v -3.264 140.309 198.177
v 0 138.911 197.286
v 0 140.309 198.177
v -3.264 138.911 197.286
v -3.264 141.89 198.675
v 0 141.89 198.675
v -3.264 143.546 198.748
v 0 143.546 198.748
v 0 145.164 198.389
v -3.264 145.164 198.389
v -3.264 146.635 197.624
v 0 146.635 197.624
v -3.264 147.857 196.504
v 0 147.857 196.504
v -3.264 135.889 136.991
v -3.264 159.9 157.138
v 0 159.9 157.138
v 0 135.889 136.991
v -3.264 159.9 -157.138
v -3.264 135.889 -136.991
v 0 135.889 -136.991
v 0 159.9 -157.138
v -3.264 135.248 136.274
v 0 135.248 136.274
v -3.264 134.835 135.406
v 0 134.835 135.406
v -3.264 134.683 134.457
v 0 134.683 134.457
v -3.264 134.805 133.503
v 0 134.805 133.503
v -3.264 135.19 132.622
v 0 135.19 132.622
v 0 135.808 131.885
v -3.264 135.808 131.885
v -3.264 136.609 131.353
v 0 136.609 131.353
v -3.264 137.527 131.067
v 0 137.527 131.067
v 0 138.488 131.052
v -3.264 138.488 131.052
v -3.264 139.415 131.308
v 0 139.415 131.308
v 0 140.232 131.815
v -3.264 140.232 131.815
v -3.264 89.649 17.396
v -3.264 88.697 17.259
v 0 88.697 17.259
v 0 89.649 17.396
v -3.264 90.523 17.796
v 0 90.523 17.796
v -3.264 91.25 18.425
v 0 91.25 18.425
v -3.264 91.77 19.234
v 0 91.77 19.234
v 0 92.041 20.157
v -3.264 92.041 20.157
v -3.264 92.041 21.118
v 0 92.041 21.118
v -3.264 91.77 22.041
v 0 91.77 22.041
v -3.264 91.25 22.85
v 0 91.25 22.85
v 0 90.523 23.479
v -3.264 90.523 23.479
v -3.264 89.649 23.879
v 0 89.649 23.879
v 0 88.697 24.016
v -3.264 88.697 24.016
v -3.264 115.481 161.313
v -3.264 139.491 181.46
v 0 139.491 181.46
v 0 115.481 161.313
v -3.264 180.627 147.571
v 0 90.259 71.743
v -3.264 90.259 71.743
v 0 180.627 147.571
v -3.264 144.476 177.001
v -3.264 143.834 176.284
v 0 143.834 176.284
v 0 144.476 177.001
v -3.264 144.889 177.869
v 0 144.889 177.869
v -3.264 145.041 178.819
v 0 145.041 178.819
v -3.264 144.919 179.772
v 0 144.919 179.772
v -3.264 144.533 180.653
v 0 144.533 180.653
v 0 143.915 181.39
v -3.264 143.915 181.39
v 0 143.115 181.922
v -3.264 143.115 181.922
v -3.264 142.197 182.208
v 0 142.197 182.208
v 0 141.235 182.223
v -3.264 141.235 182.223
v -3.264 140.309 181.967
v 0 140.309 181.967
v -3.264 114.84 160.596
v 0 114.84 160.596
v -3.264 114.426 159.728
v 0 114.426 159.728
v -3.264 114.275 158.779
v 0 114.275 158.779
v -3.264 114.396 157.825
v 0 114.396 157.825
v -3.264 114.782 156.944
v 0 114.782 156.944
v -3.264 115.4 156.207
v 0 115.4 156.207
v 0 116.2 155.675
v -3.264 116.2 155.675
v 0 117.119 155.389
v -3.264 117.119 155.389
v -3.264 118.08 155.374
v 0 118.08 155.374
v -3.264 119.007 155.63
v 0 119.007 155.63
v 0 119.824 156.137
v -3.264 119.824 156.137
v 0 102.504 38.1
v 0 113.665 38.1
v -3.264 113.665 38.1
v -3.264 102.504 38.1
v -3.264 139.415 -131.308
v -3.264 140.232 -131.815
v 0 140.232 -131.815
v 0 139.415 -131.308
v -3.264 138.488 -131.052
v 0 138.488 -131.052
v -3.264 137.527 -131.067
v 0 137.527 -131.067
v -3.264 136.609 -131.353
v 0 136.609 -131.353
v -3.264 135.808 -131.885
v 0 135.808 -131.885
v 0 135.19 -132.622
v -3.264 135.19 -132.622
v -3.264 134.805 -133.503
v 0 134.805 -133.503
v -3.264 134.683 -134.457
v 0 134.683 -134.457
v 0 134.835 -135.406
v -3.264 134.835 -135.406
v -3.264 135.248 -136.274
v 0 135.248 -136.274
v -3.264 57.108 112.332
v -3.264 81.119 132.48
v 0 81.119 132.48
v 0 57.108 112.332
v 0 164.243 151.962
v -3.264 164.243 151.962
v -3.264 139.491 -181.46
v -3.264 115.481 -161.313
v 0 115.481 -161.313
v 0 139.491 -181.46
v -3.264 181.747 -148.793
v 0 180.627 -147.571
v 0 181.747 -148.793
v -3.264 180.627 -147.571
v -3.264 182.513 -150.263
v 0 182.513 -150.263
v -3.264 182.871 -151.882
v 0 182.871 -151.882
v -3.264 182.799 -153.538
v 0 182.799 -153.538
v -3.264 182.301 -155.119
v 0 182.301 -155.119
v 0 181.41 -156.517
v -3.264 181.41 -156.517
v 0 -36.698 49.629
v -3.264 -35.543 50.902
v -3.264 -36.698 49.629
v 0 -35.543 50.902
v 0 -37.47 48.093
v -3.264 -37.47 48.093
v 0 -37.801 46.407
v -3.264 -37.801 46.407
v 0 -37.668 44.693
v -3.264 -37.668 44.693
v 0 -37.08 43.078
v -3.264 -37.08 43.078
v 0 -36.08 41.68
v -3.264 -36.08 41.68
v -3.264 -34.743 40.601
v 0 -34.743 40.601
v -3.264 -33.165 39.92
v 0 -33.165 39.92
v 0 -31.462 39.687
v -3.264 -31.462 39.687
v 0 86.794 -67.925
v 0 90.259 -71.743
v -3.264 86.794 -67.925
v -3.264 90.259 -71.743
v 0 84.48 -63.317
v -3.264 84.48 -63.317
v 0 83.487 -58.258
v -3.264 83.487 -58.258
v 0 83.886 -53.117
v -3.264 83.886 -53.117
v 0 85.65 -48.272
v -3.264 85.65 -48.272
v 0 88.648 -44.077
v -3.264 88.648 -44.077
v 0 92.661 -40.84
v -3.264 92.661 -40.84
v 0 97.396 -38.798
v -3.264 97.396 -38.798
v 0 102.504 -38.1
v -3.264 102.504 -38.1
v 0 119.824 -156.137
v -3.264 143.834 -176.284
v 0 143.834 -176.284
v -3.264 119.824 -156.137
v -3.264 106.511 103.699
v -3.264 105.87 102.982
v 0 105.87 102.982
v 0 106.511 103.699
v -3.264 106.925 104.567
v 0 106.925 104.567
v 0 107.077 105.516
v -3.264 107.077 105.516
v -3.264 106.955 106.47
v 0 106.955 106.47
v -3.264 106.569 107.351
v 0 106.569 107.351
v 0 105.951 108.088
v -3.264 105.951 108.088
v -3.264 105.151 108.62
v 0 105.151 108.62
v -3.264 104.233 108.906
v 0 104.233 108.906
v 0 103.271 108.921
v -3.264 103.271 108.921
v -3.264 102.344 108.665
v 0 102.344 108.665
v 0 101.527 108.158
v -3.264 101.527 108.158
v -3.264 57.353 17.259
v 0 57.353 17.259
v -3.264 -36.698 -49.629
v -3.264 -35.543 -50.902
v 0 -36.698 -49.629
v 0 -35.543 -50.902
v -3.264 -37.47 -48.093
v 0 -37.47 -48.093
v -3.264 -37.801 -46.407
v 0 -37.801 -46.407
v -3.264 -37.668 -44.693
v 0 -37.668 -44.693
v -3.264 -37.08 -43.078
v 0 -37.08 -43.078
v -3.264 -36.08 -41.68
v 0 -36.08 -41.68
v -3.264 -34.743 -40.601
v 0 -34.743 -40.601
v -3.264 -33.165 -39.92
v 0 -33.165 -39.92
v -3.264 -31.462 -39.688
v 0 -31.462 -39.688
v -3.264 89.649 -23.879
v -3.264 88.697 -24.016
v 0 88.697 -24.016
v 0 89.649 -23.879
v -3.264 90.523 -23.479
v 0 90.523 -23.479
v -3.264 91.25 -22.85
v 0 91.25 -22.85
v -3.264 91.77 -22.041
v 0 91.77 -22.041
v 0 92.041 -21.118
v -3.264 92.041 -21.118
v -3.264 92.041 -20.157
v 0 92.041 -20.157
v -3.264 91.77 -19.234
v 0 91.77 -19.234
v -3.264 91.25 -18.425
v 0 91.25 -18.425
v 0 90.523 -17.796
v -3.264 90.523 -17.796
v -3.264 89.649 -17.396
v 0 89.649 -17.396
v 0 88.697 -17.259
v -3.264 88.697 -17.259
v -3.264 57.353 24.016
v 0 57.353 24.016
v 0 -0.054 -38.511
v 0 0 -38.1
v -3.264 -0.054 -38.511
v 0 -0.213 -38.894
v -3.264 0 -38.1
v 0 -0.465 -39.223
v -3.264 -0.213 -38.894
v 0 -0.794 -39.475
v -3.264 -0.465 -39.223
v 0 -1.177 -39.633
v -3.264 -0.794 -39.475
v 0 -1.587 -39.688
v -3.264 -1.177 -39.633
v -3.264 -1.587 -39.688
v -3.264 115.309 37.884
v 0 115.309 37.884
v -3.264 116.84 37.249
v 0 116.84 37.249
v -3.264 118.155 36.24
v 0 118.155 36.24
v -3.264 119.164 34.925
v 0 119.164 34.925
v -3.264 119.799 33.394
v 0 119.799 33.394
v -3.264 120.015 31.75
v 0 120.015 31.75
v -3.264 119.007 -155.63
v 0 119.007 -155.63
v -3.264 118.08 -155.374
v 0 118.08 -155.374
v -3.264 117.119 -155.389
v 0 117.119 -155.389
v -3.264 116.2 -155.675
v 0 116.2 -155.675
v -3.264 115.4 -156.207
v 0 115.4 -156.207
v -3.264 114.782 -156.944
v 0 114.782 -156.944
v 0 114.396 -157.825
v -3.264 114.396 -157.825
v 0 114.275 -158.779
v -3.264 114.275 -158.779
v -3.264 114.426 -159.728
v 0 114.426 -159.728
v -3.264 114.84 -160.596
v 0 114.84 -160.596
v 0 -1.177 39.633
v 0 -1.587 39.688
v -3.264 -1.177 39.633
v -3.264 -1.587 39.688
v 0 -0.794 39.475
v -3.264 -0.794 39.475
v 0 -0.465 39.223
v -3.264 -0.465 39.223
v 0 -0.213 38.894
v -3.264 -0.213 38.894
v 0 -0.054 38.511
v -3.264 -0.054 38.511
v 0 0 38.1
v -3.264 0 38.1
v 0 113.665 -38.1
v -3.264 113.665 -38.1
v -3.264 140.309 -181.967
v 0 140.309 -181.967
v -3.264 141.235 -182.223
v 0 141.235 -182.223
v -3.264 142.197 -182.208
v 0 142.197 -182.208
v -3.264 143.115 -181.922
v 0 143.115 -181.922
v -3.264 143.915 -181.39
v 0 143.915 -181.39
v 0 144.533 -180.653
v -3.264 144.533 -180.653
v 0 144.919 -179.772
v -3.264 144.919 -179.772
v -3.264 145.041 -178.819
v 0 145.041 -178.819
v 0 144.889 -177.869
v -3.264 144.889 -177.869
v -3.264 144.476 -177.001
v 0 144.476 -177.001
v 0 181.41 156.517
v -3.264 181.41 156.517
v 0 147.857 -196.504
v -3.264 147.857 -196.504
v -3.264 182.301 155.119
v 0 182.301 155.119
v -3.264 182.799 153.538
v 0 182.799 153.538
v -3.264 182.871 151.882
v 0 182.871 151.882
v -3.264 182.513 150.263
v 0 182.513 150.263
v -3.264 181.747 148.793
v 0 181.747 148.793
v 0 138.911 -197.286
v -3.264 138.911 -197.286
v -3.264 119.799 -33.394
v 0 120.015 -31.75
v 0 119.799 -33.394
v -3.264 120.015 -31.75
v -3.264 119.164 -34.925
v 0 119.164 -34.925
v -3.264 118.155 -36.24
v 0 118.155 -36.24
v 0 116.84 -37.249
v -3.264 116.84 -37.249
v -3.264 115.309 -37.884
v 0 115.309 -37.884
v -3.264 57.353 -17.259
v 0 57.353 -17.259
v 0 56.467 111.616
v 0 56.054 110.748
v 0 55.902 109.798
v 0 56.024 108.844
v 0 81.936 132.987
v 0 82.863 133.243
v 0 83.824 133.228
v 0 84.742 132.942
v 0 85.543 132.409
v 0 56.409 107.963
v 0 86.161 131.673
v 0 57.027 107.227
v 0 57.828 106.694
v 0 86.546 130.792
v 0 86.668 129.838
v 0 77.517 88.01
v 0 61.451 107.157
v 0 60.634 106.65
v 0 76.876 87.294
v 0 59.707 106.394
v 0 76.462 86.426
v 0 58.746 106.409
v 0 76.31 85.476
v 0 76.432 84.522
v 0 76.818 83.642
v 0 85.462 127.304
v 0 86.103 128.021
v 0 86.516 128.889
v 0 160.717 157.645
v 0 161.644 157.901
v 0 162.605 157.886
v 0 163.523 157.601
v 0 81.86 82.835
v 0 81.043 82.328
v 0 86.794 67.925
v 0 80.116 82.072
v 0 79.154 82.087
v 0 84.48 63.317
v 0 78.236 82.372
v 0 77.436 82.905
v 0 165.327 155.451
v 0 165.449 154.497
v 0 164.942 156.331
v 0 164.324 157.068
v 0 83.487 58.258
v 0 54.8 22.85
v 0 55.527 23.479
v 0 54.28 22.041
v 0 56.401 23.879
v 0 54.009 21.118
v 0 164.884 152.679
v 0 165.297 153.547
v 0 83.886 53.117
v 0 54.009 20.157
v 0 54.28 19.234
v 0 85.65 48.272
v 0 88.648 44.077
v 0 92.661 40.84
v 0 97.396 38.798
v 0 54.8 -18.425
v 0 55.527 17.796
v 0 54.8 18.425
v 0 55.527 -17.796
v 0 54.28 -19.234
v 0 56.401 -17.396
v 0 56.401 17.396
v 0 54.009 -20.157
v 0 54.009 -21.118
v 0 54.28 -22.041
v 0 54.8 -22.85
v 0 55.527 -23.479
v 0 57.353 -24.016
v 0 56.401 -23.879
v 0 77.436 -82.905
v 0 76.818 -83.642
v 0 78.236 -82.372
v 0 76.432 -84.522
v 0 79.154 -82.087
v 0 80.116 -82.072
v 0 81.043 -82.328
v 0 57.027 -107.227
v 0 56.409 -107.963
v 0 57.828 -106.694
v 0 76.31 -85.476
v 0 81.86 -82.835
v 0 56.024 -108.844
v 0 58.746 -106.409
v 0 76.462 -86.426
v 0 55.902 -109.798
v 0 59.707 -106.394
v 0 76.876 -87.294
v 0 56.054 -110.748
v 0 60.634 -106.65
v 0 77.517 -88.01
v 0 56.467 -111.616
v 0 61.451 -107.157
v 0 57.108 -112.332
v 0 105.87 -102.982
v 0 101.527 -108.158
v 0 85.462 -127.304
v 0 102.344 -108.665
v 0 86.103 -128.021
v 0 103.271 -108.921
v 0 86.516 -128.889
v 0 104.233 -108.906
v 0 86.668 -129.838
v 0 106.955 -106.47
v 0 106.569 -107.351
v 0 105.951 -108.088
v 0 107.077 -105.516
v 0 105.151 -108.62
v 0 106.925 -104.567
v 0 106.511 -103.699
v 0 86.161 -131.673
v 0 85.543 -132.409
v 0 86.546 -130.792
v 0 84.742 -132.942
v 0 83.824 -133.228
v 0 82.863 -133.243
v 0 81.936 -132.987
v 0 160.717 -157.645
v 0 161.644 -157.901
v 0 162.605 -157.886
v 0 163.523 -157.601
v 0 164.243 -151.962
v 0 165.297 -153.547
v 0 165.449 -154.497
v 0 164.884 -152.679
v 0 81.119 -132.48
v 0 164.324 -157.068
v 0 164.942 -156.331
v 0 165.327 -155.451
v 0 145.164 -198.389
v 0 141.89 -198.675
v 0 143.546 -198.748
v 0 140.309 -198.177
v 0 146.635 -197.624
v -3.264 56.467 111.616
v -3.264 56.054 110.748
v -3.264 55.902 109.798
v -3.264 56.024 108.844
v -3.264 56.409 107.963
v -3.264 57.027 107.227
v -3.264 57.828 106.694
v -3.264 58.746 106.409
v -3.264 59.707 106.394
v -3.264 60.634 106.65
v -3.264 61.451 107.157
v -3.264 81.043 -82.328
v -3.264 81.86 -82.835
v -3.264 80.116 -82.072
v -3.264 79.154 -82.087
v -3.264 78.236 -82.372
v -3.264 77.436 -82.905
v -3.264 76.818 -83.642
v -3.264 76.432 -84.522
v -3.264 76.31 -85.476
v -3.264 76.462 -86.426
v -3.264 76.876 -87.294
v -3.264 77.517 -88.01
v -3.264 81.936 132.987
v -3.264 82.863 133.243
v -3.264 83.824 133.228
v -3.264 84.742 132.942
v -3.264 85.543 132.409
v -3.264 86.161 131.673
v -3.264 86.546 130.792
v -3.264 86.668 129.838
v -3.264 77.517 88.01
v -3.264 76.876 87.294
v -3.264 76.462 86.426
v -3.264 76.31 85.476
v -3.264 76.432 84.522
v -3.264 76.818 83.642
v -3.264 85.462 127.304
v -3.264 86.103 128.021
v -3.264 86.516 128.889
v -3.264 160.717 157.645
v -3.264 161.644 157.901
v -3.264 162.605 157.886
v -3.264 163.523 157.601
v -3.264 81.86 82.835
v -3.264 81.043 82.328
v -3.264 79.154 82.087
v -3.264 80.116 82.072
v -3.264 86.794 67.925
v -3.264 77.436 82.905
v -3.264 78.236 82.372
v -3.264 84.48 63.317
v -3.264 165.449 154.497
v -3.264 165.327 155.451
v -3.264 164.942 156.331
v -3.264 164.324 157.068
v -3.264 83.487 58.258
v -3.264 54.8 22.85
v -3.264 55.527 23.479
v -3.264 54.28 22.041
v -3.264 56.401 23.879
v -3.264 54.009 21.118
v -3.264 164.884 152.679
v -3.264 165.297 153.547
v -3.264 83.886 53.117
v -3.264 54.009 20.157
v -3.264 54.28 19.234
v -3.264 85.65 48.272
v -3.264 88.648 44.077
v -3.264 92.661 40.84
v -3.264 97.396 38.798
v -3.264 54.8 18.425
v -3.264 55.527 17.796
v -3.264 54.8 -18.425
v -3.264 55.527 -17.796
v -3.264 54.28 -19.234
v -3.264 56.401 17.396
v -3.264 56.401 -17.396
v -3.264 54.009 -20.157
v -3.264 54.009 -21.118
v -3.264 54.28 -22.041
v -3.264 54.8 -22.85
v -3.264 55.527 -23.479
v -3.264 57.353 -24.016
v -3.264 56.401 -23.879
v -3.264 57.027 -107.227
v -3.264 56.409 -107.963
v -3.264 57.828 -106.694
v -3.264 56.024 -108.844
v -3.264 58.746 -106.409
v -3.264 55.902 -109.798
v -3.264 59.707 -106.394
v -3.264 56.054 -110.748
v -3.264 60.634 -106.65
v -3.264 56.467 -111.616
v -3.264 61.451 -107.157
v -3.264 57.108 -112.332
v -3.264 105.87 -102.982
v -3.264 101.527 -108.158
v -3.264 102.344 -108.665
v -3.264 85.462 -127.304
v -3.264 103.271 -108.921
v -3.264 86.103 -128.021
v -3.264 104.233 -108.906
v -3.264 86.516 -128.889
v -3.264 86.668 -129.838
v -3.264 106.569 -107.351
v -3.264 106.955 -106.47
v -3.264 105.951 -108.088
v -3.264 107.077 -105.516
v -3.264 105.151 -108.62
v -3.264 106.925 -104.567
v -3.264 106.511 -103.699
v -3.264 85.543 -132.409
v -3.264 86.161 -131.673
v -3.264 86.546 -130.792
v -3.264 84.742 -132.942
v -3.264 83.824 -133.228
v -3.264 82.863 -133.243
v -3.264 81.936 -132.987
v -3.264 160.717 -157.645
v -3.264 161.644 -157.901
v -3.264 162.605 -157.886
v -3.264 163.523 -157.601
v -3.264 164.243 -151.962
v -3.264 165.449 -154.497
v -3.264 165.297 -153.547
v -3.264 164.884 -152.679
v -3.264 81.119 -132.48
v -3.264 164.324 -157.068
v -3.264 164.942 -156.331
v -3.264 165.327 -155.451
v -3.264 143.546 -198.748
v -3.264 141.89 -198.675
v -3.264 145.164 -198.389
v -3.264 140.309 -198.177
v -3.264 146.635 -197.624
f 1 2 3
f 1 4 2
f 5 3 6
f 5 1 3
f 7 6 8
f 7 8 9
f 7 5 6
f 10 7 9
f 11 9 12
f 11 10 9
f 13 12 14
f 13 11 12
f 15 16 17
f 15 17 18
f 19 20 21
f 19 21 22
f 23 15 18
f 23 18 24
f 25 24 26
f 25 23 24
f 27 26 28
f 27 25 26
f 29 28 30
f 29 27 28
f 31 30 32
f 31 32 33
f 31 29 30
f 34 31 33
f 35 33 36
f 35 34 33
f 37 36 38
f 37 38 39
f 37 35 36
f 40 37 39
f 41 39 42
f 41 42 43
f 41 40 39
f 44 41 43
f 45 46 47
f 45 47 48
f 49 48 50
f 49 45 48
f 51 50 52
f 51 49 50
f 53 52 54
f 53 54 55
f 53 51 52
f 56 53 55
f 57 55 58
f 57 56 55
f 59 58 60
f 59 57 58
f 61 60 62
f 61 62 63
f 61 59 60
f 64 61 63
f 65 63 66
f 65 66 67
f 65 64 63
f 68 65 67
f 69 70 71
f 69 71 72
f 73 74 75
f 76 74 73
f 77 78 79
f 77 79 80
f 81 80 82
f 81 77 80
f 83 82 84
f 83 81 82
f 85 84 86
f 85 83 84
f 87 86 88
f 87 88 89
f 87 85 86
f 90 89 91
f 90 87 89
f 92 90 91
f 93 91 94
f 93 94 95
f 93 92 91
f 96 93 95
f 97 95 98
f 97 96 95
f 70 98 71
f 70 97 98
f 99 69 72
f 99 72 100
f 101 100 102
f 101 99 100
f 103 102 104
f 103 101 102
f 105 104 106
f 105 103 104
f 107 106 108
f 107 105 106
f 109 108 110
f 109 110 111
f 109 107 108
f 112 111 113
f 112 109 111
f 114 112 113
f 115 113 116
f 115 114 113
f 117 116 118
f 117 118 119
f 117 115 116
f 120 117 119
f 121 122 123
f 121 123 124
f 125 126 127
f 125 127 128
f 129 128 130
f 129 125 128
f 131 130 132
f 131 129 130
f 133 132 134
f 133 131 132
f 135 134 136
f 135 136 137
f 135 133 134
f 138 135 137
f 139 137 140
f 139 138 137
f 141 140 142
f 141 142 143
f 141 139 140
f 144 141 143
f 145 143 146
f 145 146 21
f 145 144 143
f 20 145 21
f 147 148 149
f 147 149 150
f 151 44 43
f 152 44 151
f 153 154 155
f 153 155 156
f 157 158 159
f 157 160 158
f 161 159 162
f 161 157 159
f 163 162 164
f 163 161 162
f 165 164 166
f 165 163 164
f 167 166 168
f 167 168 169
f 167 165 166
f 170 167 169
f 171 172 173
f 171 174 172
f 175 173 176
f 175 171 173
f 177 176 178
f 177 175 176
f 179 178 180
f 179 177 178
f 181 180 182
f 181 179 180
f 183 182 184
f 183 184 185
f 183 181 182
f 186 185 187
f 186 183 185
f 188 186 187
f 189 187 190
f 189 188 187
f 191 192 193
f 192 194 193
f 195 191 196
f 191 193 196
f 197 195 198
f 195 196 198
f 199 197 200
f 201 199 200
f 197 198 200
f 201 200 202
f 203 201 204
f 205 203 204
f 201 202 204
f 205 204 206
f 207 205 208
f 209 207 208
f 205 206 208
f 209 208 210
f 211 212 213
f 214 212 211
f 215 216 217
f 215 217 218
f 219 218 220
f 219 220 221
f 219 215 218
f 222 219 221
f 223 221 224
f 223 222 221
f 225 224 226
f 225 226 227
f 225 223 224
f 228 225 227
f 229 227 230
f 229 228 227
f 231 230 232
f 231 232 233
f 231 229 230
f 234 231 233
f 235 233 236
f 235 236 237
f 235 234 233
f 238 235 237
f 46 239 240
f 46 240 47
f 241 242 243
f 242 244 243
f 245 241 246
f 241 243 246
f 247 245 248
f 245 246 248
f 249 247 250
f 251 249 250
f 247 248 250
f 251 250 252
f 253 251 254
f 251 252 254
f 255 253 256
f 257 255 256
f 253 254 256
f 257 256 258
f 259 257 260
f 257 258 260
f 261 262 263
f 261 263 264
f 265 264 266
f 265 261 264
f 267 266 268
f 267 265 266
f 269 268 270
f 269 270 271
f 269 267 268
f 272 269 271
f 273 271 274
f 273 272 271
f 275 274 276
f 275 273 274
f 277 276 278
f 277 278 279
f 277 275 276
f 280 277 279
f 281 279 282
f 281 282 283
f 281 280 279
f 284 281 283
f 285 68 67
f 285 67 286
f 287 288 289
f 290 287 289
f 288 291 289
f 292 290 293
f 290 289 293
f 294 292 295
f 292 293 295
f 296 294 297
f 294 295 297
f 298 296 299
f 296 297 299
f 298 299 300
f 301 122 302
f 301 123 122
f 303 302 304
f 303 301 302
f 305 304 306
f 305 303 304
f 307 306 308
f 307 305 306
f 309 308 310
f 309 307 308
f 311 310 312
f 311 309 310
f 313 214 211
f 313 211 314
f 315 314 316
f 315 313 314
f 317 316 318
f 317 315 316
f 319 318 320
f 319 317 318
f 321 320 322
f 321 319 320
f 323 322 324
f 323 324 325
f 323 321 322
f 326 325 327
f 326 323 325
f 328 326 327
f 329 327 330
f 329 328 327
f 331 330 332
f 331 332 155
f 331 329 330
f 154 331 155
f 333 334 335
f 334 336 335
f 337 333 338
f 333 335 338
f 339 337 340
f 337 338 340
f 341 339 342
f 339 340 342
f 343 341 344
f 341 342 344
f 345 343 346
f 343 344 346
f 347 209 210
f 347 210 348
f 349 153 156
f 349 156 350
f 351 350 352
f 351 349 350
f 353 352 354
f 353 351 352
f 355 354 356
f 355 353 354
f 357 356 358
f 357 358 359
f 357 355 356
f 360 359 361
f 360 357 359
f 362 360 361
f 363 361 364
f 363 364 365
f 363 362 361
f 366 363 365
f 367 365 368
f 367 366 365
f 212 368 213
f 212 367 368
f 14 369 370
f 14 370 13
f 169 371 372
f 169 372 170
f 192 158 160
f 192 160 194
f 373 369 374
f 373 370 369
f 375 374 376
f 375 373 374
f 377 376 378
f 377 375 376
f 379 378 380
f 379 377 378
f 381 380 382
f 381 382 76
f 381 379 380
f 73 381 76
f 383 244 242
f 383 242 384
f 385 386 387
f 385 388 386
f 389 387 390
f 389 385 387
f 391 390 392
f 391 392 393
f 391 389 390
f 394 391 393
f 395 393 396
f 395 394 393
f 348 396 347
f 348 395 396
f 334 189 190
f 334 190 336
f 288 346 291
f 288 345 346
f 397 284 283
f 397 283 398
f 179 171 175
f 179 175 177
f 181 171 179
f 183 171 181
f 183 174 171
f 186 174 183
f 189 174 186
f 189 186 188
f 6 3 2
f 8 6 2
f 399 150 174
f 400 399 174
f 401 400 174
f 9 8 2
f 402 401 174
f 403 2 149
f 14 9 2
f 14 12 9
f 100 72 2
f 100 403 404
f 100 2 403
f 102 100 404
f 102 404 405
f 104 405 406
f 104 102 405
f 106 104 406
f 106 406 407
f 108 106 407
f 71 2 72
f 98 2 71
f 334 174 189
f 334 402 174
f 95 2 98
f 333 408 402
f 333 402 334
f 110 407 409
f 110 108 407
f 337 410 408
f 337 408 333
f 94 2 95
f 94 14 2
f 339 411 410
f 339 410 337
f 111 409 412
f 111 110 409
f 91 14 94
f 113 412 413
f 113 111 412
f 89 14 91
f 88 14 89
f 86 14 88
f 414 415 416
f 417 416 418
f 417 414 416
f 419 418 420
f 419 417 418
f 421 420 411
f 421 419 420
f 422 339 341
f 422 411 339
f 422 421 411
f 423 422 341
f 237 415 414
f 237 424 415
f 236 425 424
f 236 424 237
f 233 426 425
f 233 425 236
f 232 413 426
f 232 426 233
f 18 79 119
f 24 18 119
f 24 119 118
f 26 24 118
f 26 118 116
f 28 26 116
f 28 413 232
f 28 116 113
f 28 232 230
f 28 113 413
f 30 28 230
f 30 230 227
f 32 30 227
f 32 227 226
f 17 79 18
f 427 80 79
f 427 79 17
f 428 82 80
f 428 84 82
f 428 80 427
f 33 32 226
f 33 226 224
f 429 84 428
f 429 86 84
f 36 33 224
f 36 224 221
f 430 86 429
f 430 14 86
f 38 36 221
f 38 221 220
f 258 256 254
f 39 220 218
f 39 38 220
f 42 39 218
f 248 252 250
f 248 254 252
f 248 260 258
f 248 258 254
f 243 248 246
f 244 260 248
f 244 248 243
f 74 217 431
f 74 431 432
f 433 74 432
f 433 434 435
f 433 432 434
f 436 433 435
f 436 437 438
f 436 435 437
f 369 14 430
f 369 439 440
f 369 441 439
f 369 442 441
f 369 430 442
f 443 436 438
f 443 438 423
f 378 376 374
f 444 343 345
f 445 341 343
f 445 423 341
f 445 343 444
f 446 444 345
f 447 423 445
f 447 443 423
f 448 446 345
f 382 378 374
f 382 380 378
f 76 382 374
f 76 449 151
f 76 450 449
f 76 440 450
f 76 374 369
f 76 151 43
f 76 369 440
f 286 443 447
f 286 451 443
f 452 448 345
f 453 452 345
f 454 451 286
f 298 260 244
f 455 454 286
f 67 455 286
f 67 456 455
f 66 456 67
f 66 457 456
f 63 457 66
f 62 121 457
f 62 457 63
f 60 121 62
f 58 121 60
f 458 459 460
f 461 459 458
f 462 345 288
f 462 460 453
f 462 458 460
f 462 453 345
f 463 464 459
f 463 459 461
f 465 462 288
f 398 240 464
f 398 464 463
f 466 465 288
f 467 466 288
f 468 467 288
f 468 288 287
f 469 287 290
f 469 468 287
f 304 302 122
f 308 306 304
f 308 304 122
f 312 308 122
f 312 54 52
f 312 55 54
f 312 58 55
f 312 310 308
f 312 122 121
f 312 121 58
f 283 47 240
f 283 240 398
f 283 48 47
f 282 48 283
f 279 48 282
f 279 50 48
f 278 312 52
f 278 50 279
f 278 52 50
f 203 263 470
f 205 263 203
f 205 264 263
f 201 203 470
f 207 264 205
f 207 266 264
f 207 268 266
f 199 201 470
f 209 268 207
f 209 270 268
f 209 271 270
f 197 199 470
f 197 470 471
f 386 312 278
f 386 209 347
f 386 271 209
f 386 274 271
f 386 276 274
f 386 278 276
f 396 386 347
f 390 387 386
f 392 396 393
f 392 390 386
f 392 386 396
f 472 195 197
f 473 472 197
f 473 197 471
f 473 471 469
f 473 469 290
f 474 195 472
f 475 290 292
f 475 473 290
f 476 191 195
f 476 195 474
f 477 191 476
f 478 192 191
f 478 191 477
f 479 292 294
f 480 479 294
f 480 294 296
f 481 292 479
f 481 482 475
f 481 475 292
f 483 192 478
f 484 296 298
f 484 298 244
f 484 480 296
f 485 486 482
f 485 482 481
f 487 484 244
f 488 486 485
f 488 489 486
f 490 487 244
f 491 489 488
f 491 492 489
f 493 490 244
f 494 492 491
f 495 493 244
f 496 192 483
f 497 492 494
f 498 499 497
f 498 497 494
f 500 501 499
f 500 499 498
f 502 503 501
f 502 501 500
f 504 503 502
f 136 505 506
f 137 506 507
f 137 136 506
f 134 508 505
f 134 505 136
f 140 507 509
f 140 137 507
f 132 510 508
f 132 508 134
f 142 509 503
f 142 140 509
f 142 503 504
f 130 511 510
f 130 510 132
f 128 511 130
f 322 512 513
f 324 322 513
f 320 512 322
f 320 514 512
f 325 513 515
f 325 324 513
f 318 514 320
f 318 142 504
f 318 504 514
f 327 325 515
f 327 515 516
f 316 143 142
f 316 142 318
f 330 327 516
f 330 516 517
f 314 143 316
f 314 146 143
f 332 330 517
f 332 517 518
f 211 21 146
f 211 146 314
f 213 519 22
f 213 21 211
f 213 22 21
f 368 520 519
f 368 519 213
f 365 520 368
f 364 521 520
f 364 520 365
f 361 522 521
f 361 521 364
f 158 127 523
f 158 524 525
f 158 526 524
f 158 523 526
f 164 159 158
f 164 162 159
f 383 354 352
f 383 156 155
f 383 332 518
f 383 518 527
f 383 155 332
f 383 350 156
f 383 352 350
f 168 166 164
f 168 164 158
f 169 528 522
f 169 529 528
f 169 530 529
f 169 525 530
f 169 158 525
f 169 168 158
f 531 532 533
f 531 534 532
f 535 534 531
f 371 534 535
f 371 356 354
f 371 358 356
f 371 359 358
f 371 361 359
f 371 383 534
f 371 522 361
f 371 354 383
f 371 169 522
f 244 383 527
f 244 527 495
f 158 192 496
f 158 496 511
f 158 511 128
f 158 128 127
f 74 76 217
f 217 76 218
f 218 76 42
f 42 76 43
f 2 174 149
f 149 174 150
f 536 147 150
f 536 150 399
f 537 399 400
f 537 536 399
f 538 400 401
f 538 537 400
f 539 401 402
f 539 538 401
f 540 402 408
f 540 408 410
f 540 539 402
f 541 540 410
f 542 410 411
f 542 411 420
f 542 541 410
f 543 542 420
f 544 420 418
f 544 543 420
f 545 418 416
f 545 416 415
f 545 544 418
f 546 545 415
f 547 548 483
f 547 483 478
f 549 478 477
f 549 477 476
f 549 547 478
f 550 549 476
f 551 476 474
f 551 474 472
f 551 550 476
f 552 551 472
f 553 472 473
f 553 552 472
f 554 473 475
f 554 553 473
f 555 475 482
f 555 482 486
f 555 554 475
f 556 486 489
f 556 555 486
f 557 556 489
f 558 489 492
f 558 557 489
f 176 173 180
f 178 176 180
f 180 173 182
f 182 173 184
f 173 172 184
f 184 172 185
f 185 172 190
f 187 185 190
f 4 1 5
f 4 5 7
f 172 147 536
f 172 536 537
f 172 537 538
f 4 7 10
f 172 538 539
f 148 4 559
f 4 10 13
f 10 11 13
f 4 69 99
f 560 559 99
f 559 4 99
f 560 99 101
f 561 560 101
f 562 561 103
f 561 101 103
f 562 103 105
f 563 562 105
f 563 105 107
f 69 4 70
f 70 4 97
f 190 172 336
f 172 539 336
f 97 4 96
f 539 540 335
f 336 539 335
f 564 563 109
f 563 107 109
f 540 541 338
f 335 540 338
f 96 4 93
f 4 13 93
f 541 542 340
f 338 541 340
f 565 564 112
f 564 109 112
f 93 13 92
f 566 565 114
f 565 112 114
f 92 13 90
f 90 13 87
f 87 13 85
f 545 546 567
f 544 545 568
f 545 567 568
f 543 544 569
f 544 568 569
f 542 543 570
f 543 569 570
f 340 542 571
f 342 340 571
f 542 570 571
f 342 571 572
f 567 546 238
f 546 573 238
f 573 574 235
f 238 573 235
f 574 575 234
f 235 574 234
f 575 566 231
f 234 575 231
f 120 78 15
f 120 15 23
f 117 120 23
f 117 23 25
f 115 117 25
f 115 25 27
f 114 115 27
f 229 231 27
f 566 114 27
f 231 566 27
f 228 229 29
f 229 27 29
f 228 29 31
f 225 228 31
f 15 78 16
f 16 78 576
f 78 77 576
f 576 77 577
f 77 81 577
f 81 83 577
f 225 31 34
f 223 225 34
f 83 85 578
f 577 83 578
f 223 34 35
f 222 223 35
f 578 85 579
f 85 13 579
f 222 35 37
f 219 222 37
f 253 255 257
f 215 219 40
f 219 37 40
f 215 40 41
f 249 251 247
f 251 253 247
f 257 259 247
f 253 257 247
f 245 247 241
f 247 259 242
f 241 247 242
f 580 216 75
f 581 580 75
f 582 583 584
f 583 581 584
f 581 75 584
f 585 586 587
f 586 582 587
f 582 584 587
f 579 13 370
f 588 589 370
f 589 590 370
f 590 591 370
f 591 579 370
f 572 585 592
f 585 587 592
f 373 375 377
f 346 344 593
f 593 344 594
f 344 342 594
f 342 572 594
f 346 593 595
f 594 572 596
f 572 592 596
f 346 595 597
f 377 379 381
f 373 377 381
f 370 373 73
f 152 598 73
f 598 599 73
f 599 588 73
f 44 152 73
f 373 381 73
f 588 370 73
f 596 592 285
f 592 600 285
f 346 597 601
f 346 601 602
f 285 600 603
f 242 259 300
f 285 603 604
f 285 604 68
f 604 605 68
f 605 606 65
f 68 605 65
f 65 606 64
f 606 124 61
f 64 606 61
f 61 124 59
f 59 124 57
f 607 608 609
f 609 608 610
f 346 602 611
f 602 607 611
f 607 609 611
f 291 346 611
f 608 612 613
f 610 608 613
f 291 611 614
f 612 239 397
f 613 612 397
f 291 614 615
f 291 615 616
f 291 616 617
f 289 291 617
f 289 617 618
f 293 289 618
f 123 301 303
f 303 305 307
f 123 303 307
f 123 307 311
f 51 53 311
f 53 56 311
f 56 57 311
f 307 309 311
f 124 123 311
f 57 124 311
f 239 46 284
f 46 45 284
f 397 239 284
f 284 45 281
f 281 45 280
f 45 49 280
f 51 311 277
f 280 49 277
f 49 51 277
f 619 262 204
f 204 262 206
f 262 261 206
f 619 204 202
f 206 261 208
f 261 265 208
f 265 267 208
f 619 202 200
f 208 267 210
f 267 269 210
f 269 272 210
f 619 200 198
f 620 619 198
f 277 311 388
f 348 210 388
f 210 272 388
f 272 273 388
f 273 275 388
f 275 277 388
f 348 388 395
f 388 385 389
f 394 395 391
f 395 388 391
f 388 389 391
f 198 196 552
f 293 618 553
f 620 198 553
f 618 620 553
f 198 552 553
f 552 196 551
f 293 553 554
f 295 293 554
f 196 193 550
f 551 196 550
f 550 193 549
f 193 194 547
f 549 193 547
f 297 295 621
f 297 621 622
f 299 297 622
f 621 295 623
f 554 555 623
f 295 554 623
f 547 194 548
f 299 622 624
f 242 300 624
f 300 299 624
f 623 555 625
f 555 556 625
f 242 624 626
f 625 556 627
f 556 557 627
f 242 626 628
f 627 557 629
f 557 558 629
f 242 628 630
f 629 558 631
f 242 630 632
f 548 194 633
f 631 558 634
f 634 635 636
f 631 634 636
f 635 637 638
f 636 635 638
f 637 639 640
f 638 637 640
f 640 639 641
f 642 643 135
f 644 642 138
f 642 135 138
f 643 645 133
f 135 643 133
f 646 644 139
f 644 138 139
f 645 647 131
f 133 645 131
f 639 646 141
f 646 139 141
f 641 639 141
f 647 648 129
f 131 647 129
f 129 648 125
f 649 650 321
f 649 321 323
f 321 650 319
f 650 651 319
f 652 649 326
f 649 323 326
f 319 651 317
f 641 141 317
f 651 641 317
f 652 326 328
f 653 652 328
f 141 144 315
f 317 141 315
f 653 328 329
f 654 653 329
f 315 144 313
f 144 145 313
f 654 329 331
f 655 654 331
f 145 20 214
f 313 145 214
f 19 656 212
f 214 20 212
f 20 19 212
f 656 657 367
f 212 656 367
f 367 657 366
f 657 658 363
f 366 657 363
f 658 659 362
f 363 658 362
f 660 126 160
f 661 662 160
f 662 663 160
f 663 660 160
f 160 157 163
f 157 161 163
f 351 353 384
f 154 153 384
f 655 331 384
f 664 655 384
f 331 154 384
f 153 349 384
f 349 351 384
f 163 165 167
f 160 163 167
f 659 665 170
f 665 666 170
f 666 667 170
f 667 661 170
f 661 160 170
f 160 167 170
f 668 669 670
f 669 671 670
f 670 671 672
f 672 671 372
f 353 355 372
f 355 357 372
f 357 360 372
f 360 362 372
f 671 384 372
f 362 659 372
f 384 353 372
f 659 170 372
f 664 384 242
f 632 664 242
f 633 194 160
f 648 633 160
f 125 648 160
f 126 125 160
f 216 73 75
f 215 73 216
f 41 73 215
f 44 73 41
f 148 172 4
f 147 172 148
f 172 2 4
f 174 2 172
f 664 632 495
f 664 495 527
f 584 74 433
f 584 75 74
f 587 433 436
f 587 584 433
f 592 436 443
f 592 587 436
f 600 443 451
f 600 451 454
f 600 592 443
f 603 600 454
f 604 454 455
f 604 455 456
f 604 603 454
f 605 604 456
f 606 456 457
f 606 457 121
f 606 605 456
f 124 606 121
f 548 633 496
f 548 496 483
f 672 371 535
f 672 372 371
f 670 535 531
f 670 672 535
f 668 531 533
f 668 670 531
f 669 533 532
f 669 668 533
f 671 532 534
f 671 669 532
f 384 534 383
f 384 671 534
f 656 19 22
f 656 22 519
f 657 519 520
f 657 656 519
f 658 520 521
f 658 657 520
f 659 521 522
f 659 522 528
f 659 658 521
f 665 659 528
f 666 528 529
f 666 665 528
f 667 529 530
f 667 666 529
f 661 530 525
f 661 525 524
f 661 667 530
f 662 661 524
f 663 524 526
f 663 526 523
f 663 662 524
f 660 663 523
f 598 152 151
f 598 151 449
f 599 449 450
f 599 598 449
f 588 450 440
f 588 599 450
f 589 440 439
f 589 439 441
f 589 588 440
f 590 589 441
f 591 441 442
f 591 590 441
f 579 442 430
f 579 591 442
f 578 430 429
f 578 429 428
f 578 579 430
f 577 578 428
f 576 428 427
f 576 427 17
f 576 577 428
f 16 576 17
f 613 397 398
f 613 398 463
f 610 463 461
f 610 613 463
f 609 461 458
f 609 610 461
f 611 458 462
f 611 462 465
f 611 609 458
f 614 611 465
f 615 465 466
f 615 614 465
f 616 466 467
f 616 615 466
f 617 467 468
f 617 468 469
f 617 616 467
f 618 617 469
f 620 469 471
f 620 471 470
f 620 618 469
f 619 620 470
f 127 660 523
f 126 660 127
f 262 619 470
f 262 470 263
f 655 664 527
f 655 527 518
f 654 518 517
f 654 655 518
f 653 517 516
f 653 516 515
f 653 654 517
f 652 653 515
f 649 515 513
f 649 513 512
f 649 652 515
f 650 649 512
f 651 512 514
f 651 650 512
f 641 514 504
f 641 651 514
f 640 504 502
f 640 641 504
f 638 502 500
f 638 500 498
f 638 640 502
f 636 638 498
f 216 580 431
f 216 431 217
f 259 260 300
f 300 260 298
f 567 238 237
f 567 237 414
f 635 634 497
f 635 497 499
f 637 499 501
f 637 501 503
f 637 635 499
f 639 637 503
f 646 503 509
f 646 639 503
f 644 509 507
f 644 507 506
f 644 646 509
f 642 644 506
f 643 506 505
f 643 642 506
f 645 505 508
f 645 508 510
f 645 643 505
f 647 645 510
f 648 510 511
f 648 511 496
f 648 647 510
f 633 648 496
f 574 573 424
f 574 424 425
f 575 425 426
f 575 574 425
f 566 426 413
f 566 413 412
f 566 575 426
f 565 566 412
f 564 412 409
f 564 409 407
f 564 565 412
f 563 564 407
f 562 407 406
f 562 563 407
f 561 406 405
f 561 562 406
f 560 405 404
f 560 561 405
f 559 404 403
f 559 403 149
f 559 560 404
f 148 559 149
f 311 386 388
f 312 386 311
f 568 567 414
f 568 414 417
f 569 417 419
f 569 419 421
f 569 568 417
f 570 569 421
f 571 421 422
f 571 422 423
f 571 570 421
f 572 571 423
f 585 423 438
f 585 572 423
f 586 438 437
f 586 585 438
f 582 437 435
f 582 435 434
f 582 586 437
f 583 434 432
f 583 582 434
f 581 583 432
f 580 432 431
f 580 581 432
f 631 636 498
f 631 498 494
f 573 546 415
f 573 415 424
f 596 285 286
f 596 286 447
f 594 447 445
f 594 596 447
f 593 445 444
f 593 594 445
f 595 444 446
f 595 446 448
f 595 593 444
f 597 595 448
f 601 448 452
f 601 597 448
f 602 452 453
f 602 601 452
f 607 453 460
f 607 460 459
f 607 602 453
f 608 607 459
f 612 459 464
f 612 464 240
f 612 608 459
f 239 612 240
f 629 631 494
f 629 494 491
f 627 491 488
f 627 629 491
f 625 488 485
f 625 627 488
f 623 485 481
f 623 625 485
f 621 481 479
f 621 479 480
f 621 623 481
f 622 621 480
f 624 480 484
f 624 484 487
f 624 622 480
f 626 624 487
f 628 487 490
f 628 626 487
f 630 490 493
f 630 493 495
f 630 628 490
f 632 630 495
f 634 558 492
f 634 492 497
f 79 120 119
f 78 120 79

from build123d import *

# Parameters (mm, degrees)
BASE_FLANGE1_DEPTH          = 3.2639
F_1_4_START                 = -3.2639
F_1_4_CLEARANCE_SLOT1_DEPTH = 3.2639
SKETCH9_W                   = 1.5875
SKETCH9_H                   = 50.8
CUT_EXTRUDE1_DEPTH          = 274.80079868
FILLET1_R                   = 6.35
FILLET2_R                   = 19.05
FILLET3_R                   = 6.35
FILLET4_R                   = 1.5875
F_1_4_CLEARANCE_SLOT2_DEPTH = 3.2639
F_1_4_CLEARANCE_SLOT3_DEPTH = 3.2639


# Read off the part's stored shape, not the designer's step: 1/4 Clearance Slot1, 1/4 Clearance Slot2, 1/4 Clearance Slot3
# Sheet-metal steps are written as plain solids
with BuildPart() as part:
    # Sketch1 → Base-Flange1 (new body)
    with BuildSketch(Plane(origin=(0, 0, 0), x_dir=(0, 0, -1), z_dir=(1, 0, 0))):
        Polygon((38.1, 0), (38.1, -50.8), (201.36805286, 143.775288552), (151.652495469, 185.491594423), (38.1, 50.165), (38.1, 120.015), (-38.1, 120.015), (-38.1, 50.165), (-151.652495469, 185.491594423), (-201.36805286, 143.775288552), (-38.1, -50.8), (-38.1, 0), align=None)
    extrude(amount=-BASE_FLANGE1_DEPTH)

    # 1/4 Clearance Slot1 outline → 1/4 Clearance Slot1 (cut)
    with BuildSketch(Plane.YZ.offset(F_1_4_START)):
        with BuildLine():
            Line((57.3532, -24.0157), (88.6968, -24.0157))
            ThreePointArc((88.6968, -24.0157), (92.075, -20.6375), (88.6968, -17.2593))
            Line((88.6968, -17.2593), (57.3532, -17.2593))
            ThreePointArc((57.3532, -17.2593), (53.975, -20.6375), (57.3532, -24.0157))
        make_face()
        with BuildLine():
            Line((57.3532, 17.2593), (88.6968, 17.2593))
            ThreePointArc((88.6968, 17.2593), (92.075, 20.6375), (88.6968, 24.0157))
            Line((88.6968, 24.0157), (57.3532, 24.0157))
            ThreePointArc((57.3532, 24.0157), (53.975, 20.6375), (57.3532, 17.2593))
        make_face()
    extrude(amount=F_1_4_CLEARANCE_SLOT1_DEPTH, mode=Mode.SUBTRACT)

    # Sketch9 → Cut-Extrude1 (cut, through all)
    with BuildSketch(Plane(origin=(0, 0, 0), x_dir=(0, 0, -1), z_dir=(1, 0, 0))):
        with Locations((-38.89375, -25.4)):
            Rectangle(SKETCH9_W, SKETCH9_H)
        with Locations((38.89375, -25.4)):
            Rectangle(SKETCH9_W, SKETCH9_H)
    extrude(amount=-CUT_EXTRUDE1_DEPTH, mode=Mode.SUBTRACT)

    # Fillet1
    fillet1_edges = [part.edges().sort_by_distance(p)[0] for p in [
        (-1.63195, 185.491594423, -151.652495469),
        (-1.63195, 143.775288552, -201.36805286),
        (-1.63195, 143.775288552, 201.36805286),
        (-1.63195, 185.491594423, 151.652495469),
        (-1.63195, -48.908091172, 39.6875),
        (-1.63195, -48.908091172, -39.6875),
    ]]
    fillet(fillet1_edges, radius=FILLET1_R)

    # Fillet2
    fillet2_edges = [part.edges().sort_by_distance(p)[0] for p in [
        (-1.63195, 50.165, -38.1),
        (-1.63195, 50.165, 38.1),
    ]]
    fillet(fillet2_edges, radius=FILLET2_R)

    # Fillet3
    fillet3_edges = [part.edges().sort_by_distance(p)[0] for p in [
        (-1.63195, 120.015, 38.1),
        (-1.63195, 120.015, -38.1),
    ]]
    fillet(fillet3_edges, radius=FILLET3_R)

    # Fillet4
    fillet4_edges = [part.edges().sort_by_distance(p)[0] for p in [
        (-1.63195, 0, 39.6875),
        (-1.63195, 0, -39.6875),
    ]]
    fillet(fillet4_edges, radius=FILLET4_R)

    # 1/4 Clearance Slot2 outline → 1/4 Clearance Slot2 (cut)
    with BuildSketch(Plane.YZ.offset(F_1_4_START)):
        with BuildLine():
            Line((105.870311236, -102.982051315), (81.859720628, -82.834773592))
            ThreePointArc((81.859720628, -82.834773592), (77.100404187, -83.251159826), (77.516790422, -88.010476267))
            Line((77.516790422, -88.010476267), (101.527381029, -108.15775399))
            ThreePointArc((101.527381029, -108.15775399), (106.28669747, -107.741367756), (105.870311236, -102.982051315))
        make_face()
        with BuildLine():
            ThreePointArc((140.232307194, -131.81518945), (135.472990753, -132.231575685), (135.889376988, -136.990892126))
            Line((135.889376988, -136.990892126), (159.899967595, -157.138169849))
            ThreePointArc((159.899967595, -157.138169849), (164.659284036, -156.721783614), (164.242897801, -151.962467173))
            Line((164.242897801, -151.962467173), (140.232307194, -131.81518945))
        make_face()
        with BuildLine():
            Line((85.461804628, -127.303962384), (61.451214021, -107.156684661))
            ThreePointArc((61.451214021, -107.156684661), (56.69189758, -107.573070895), (57.108283815, -112.332387336))
            Line((57.108283815, -112.332387336), (81.118874422, -132.479665059))
            ThreePointArc((81.118874422, -132.479665059), (85.878190863, -132.063278825), (85.461804628, -127.303962384))
        make_face()
        with BuildLine():
            ThreePointArc((119.823800586, -156.137100519), (115.064484146, -156.553486754), (115.48087038, -161.312803195))
            Line((115.48087038, -161.312803195), (139.491460988, -181.460080918))
            ThreePointArc((139.491460988, -181.460080918), (144.250777428, -181.043694683), (143.834391194, -176.284378242))
            Line((143.834391194, -176.284378242), (119.823800586, -156.137100519))
        make_face()
    extrude(amount=F_1_4_CLEARANCE_SLOT2_DEPTH, mode=Mode.SUBTRACT)

    # 1/4 Clearance Slot3 outline → 1/4 Clearance Slot3 (cut)
    with BuildSketch(Plane.YZ.offset(F_1_4_START)):
        with BuildLine():
            Line((61.451214021, 107.156684661), (85.461804628, 127.303962384))
            ThreePointArc((85.461804628, 127.303962384), (85.878190863, 132.063278825), (81.118874422, 132.479665059))
            Line((81.118874422, 132.479665059), (57.108283815, 112.332387336))
            ThreePointArc((57.108283815, 112.332387336), (56.69189758, 107.573070895), (61.451214021, 107.156684661))
        make_face()
        with BuildLine():
            ThreePointArc((143.834391194, 176.284378242), (144.250777428, 181.043694683), (139.491460988, 181.460080918))
            Line((139.491460988, 181.460080918), (115.48087038, 161.312803195))
            ThreePointArc((115.48087038, 161.312803195), (115.064484146, 156.553486754), (119.823800586, 156.137100519))
            Line((119.823800586, 156.137100519), (143.834391194, 176.284378242))
        make_face()
        with BuildLine():
            Line((81.859720628, 82.834773592), (105.870311236, 102.982051315))
            ThreePointArc((105.870311236, 102.982051315), (106.28669747, 107.741367756), (101.527381029, 108.15775399))
            Line((101.527381029, 108.15775399), (77.516790422, 88.010476267))
            ThreePointArc((77.516790422, 88.010476267), (77.100404187, 83.251159826), (81.859720628, 82.834773592))
        make_face()
        with BuildLine():
            ThreePointArc((164.242897801, 151.962467173), (164.659284036, 156.721783614), (159.899967595, 157.138169849))
            Line((159.899967595, 157.138169849), (135.889376988, 136.990892126))
            ThreePointArc((135.889376988, 136.990892126), (135.472990753, 132.231575685), (140.232307194, 131.81518945))
            Line((140.232307194, 131.81518945), (164.242897801, 151.962467173))
        make_face()
    extrude(amount=F_1_4_CLEARANCE_SLOT3_DEPTH, mode=Mode.SUBTRACT)


solid = part.part
